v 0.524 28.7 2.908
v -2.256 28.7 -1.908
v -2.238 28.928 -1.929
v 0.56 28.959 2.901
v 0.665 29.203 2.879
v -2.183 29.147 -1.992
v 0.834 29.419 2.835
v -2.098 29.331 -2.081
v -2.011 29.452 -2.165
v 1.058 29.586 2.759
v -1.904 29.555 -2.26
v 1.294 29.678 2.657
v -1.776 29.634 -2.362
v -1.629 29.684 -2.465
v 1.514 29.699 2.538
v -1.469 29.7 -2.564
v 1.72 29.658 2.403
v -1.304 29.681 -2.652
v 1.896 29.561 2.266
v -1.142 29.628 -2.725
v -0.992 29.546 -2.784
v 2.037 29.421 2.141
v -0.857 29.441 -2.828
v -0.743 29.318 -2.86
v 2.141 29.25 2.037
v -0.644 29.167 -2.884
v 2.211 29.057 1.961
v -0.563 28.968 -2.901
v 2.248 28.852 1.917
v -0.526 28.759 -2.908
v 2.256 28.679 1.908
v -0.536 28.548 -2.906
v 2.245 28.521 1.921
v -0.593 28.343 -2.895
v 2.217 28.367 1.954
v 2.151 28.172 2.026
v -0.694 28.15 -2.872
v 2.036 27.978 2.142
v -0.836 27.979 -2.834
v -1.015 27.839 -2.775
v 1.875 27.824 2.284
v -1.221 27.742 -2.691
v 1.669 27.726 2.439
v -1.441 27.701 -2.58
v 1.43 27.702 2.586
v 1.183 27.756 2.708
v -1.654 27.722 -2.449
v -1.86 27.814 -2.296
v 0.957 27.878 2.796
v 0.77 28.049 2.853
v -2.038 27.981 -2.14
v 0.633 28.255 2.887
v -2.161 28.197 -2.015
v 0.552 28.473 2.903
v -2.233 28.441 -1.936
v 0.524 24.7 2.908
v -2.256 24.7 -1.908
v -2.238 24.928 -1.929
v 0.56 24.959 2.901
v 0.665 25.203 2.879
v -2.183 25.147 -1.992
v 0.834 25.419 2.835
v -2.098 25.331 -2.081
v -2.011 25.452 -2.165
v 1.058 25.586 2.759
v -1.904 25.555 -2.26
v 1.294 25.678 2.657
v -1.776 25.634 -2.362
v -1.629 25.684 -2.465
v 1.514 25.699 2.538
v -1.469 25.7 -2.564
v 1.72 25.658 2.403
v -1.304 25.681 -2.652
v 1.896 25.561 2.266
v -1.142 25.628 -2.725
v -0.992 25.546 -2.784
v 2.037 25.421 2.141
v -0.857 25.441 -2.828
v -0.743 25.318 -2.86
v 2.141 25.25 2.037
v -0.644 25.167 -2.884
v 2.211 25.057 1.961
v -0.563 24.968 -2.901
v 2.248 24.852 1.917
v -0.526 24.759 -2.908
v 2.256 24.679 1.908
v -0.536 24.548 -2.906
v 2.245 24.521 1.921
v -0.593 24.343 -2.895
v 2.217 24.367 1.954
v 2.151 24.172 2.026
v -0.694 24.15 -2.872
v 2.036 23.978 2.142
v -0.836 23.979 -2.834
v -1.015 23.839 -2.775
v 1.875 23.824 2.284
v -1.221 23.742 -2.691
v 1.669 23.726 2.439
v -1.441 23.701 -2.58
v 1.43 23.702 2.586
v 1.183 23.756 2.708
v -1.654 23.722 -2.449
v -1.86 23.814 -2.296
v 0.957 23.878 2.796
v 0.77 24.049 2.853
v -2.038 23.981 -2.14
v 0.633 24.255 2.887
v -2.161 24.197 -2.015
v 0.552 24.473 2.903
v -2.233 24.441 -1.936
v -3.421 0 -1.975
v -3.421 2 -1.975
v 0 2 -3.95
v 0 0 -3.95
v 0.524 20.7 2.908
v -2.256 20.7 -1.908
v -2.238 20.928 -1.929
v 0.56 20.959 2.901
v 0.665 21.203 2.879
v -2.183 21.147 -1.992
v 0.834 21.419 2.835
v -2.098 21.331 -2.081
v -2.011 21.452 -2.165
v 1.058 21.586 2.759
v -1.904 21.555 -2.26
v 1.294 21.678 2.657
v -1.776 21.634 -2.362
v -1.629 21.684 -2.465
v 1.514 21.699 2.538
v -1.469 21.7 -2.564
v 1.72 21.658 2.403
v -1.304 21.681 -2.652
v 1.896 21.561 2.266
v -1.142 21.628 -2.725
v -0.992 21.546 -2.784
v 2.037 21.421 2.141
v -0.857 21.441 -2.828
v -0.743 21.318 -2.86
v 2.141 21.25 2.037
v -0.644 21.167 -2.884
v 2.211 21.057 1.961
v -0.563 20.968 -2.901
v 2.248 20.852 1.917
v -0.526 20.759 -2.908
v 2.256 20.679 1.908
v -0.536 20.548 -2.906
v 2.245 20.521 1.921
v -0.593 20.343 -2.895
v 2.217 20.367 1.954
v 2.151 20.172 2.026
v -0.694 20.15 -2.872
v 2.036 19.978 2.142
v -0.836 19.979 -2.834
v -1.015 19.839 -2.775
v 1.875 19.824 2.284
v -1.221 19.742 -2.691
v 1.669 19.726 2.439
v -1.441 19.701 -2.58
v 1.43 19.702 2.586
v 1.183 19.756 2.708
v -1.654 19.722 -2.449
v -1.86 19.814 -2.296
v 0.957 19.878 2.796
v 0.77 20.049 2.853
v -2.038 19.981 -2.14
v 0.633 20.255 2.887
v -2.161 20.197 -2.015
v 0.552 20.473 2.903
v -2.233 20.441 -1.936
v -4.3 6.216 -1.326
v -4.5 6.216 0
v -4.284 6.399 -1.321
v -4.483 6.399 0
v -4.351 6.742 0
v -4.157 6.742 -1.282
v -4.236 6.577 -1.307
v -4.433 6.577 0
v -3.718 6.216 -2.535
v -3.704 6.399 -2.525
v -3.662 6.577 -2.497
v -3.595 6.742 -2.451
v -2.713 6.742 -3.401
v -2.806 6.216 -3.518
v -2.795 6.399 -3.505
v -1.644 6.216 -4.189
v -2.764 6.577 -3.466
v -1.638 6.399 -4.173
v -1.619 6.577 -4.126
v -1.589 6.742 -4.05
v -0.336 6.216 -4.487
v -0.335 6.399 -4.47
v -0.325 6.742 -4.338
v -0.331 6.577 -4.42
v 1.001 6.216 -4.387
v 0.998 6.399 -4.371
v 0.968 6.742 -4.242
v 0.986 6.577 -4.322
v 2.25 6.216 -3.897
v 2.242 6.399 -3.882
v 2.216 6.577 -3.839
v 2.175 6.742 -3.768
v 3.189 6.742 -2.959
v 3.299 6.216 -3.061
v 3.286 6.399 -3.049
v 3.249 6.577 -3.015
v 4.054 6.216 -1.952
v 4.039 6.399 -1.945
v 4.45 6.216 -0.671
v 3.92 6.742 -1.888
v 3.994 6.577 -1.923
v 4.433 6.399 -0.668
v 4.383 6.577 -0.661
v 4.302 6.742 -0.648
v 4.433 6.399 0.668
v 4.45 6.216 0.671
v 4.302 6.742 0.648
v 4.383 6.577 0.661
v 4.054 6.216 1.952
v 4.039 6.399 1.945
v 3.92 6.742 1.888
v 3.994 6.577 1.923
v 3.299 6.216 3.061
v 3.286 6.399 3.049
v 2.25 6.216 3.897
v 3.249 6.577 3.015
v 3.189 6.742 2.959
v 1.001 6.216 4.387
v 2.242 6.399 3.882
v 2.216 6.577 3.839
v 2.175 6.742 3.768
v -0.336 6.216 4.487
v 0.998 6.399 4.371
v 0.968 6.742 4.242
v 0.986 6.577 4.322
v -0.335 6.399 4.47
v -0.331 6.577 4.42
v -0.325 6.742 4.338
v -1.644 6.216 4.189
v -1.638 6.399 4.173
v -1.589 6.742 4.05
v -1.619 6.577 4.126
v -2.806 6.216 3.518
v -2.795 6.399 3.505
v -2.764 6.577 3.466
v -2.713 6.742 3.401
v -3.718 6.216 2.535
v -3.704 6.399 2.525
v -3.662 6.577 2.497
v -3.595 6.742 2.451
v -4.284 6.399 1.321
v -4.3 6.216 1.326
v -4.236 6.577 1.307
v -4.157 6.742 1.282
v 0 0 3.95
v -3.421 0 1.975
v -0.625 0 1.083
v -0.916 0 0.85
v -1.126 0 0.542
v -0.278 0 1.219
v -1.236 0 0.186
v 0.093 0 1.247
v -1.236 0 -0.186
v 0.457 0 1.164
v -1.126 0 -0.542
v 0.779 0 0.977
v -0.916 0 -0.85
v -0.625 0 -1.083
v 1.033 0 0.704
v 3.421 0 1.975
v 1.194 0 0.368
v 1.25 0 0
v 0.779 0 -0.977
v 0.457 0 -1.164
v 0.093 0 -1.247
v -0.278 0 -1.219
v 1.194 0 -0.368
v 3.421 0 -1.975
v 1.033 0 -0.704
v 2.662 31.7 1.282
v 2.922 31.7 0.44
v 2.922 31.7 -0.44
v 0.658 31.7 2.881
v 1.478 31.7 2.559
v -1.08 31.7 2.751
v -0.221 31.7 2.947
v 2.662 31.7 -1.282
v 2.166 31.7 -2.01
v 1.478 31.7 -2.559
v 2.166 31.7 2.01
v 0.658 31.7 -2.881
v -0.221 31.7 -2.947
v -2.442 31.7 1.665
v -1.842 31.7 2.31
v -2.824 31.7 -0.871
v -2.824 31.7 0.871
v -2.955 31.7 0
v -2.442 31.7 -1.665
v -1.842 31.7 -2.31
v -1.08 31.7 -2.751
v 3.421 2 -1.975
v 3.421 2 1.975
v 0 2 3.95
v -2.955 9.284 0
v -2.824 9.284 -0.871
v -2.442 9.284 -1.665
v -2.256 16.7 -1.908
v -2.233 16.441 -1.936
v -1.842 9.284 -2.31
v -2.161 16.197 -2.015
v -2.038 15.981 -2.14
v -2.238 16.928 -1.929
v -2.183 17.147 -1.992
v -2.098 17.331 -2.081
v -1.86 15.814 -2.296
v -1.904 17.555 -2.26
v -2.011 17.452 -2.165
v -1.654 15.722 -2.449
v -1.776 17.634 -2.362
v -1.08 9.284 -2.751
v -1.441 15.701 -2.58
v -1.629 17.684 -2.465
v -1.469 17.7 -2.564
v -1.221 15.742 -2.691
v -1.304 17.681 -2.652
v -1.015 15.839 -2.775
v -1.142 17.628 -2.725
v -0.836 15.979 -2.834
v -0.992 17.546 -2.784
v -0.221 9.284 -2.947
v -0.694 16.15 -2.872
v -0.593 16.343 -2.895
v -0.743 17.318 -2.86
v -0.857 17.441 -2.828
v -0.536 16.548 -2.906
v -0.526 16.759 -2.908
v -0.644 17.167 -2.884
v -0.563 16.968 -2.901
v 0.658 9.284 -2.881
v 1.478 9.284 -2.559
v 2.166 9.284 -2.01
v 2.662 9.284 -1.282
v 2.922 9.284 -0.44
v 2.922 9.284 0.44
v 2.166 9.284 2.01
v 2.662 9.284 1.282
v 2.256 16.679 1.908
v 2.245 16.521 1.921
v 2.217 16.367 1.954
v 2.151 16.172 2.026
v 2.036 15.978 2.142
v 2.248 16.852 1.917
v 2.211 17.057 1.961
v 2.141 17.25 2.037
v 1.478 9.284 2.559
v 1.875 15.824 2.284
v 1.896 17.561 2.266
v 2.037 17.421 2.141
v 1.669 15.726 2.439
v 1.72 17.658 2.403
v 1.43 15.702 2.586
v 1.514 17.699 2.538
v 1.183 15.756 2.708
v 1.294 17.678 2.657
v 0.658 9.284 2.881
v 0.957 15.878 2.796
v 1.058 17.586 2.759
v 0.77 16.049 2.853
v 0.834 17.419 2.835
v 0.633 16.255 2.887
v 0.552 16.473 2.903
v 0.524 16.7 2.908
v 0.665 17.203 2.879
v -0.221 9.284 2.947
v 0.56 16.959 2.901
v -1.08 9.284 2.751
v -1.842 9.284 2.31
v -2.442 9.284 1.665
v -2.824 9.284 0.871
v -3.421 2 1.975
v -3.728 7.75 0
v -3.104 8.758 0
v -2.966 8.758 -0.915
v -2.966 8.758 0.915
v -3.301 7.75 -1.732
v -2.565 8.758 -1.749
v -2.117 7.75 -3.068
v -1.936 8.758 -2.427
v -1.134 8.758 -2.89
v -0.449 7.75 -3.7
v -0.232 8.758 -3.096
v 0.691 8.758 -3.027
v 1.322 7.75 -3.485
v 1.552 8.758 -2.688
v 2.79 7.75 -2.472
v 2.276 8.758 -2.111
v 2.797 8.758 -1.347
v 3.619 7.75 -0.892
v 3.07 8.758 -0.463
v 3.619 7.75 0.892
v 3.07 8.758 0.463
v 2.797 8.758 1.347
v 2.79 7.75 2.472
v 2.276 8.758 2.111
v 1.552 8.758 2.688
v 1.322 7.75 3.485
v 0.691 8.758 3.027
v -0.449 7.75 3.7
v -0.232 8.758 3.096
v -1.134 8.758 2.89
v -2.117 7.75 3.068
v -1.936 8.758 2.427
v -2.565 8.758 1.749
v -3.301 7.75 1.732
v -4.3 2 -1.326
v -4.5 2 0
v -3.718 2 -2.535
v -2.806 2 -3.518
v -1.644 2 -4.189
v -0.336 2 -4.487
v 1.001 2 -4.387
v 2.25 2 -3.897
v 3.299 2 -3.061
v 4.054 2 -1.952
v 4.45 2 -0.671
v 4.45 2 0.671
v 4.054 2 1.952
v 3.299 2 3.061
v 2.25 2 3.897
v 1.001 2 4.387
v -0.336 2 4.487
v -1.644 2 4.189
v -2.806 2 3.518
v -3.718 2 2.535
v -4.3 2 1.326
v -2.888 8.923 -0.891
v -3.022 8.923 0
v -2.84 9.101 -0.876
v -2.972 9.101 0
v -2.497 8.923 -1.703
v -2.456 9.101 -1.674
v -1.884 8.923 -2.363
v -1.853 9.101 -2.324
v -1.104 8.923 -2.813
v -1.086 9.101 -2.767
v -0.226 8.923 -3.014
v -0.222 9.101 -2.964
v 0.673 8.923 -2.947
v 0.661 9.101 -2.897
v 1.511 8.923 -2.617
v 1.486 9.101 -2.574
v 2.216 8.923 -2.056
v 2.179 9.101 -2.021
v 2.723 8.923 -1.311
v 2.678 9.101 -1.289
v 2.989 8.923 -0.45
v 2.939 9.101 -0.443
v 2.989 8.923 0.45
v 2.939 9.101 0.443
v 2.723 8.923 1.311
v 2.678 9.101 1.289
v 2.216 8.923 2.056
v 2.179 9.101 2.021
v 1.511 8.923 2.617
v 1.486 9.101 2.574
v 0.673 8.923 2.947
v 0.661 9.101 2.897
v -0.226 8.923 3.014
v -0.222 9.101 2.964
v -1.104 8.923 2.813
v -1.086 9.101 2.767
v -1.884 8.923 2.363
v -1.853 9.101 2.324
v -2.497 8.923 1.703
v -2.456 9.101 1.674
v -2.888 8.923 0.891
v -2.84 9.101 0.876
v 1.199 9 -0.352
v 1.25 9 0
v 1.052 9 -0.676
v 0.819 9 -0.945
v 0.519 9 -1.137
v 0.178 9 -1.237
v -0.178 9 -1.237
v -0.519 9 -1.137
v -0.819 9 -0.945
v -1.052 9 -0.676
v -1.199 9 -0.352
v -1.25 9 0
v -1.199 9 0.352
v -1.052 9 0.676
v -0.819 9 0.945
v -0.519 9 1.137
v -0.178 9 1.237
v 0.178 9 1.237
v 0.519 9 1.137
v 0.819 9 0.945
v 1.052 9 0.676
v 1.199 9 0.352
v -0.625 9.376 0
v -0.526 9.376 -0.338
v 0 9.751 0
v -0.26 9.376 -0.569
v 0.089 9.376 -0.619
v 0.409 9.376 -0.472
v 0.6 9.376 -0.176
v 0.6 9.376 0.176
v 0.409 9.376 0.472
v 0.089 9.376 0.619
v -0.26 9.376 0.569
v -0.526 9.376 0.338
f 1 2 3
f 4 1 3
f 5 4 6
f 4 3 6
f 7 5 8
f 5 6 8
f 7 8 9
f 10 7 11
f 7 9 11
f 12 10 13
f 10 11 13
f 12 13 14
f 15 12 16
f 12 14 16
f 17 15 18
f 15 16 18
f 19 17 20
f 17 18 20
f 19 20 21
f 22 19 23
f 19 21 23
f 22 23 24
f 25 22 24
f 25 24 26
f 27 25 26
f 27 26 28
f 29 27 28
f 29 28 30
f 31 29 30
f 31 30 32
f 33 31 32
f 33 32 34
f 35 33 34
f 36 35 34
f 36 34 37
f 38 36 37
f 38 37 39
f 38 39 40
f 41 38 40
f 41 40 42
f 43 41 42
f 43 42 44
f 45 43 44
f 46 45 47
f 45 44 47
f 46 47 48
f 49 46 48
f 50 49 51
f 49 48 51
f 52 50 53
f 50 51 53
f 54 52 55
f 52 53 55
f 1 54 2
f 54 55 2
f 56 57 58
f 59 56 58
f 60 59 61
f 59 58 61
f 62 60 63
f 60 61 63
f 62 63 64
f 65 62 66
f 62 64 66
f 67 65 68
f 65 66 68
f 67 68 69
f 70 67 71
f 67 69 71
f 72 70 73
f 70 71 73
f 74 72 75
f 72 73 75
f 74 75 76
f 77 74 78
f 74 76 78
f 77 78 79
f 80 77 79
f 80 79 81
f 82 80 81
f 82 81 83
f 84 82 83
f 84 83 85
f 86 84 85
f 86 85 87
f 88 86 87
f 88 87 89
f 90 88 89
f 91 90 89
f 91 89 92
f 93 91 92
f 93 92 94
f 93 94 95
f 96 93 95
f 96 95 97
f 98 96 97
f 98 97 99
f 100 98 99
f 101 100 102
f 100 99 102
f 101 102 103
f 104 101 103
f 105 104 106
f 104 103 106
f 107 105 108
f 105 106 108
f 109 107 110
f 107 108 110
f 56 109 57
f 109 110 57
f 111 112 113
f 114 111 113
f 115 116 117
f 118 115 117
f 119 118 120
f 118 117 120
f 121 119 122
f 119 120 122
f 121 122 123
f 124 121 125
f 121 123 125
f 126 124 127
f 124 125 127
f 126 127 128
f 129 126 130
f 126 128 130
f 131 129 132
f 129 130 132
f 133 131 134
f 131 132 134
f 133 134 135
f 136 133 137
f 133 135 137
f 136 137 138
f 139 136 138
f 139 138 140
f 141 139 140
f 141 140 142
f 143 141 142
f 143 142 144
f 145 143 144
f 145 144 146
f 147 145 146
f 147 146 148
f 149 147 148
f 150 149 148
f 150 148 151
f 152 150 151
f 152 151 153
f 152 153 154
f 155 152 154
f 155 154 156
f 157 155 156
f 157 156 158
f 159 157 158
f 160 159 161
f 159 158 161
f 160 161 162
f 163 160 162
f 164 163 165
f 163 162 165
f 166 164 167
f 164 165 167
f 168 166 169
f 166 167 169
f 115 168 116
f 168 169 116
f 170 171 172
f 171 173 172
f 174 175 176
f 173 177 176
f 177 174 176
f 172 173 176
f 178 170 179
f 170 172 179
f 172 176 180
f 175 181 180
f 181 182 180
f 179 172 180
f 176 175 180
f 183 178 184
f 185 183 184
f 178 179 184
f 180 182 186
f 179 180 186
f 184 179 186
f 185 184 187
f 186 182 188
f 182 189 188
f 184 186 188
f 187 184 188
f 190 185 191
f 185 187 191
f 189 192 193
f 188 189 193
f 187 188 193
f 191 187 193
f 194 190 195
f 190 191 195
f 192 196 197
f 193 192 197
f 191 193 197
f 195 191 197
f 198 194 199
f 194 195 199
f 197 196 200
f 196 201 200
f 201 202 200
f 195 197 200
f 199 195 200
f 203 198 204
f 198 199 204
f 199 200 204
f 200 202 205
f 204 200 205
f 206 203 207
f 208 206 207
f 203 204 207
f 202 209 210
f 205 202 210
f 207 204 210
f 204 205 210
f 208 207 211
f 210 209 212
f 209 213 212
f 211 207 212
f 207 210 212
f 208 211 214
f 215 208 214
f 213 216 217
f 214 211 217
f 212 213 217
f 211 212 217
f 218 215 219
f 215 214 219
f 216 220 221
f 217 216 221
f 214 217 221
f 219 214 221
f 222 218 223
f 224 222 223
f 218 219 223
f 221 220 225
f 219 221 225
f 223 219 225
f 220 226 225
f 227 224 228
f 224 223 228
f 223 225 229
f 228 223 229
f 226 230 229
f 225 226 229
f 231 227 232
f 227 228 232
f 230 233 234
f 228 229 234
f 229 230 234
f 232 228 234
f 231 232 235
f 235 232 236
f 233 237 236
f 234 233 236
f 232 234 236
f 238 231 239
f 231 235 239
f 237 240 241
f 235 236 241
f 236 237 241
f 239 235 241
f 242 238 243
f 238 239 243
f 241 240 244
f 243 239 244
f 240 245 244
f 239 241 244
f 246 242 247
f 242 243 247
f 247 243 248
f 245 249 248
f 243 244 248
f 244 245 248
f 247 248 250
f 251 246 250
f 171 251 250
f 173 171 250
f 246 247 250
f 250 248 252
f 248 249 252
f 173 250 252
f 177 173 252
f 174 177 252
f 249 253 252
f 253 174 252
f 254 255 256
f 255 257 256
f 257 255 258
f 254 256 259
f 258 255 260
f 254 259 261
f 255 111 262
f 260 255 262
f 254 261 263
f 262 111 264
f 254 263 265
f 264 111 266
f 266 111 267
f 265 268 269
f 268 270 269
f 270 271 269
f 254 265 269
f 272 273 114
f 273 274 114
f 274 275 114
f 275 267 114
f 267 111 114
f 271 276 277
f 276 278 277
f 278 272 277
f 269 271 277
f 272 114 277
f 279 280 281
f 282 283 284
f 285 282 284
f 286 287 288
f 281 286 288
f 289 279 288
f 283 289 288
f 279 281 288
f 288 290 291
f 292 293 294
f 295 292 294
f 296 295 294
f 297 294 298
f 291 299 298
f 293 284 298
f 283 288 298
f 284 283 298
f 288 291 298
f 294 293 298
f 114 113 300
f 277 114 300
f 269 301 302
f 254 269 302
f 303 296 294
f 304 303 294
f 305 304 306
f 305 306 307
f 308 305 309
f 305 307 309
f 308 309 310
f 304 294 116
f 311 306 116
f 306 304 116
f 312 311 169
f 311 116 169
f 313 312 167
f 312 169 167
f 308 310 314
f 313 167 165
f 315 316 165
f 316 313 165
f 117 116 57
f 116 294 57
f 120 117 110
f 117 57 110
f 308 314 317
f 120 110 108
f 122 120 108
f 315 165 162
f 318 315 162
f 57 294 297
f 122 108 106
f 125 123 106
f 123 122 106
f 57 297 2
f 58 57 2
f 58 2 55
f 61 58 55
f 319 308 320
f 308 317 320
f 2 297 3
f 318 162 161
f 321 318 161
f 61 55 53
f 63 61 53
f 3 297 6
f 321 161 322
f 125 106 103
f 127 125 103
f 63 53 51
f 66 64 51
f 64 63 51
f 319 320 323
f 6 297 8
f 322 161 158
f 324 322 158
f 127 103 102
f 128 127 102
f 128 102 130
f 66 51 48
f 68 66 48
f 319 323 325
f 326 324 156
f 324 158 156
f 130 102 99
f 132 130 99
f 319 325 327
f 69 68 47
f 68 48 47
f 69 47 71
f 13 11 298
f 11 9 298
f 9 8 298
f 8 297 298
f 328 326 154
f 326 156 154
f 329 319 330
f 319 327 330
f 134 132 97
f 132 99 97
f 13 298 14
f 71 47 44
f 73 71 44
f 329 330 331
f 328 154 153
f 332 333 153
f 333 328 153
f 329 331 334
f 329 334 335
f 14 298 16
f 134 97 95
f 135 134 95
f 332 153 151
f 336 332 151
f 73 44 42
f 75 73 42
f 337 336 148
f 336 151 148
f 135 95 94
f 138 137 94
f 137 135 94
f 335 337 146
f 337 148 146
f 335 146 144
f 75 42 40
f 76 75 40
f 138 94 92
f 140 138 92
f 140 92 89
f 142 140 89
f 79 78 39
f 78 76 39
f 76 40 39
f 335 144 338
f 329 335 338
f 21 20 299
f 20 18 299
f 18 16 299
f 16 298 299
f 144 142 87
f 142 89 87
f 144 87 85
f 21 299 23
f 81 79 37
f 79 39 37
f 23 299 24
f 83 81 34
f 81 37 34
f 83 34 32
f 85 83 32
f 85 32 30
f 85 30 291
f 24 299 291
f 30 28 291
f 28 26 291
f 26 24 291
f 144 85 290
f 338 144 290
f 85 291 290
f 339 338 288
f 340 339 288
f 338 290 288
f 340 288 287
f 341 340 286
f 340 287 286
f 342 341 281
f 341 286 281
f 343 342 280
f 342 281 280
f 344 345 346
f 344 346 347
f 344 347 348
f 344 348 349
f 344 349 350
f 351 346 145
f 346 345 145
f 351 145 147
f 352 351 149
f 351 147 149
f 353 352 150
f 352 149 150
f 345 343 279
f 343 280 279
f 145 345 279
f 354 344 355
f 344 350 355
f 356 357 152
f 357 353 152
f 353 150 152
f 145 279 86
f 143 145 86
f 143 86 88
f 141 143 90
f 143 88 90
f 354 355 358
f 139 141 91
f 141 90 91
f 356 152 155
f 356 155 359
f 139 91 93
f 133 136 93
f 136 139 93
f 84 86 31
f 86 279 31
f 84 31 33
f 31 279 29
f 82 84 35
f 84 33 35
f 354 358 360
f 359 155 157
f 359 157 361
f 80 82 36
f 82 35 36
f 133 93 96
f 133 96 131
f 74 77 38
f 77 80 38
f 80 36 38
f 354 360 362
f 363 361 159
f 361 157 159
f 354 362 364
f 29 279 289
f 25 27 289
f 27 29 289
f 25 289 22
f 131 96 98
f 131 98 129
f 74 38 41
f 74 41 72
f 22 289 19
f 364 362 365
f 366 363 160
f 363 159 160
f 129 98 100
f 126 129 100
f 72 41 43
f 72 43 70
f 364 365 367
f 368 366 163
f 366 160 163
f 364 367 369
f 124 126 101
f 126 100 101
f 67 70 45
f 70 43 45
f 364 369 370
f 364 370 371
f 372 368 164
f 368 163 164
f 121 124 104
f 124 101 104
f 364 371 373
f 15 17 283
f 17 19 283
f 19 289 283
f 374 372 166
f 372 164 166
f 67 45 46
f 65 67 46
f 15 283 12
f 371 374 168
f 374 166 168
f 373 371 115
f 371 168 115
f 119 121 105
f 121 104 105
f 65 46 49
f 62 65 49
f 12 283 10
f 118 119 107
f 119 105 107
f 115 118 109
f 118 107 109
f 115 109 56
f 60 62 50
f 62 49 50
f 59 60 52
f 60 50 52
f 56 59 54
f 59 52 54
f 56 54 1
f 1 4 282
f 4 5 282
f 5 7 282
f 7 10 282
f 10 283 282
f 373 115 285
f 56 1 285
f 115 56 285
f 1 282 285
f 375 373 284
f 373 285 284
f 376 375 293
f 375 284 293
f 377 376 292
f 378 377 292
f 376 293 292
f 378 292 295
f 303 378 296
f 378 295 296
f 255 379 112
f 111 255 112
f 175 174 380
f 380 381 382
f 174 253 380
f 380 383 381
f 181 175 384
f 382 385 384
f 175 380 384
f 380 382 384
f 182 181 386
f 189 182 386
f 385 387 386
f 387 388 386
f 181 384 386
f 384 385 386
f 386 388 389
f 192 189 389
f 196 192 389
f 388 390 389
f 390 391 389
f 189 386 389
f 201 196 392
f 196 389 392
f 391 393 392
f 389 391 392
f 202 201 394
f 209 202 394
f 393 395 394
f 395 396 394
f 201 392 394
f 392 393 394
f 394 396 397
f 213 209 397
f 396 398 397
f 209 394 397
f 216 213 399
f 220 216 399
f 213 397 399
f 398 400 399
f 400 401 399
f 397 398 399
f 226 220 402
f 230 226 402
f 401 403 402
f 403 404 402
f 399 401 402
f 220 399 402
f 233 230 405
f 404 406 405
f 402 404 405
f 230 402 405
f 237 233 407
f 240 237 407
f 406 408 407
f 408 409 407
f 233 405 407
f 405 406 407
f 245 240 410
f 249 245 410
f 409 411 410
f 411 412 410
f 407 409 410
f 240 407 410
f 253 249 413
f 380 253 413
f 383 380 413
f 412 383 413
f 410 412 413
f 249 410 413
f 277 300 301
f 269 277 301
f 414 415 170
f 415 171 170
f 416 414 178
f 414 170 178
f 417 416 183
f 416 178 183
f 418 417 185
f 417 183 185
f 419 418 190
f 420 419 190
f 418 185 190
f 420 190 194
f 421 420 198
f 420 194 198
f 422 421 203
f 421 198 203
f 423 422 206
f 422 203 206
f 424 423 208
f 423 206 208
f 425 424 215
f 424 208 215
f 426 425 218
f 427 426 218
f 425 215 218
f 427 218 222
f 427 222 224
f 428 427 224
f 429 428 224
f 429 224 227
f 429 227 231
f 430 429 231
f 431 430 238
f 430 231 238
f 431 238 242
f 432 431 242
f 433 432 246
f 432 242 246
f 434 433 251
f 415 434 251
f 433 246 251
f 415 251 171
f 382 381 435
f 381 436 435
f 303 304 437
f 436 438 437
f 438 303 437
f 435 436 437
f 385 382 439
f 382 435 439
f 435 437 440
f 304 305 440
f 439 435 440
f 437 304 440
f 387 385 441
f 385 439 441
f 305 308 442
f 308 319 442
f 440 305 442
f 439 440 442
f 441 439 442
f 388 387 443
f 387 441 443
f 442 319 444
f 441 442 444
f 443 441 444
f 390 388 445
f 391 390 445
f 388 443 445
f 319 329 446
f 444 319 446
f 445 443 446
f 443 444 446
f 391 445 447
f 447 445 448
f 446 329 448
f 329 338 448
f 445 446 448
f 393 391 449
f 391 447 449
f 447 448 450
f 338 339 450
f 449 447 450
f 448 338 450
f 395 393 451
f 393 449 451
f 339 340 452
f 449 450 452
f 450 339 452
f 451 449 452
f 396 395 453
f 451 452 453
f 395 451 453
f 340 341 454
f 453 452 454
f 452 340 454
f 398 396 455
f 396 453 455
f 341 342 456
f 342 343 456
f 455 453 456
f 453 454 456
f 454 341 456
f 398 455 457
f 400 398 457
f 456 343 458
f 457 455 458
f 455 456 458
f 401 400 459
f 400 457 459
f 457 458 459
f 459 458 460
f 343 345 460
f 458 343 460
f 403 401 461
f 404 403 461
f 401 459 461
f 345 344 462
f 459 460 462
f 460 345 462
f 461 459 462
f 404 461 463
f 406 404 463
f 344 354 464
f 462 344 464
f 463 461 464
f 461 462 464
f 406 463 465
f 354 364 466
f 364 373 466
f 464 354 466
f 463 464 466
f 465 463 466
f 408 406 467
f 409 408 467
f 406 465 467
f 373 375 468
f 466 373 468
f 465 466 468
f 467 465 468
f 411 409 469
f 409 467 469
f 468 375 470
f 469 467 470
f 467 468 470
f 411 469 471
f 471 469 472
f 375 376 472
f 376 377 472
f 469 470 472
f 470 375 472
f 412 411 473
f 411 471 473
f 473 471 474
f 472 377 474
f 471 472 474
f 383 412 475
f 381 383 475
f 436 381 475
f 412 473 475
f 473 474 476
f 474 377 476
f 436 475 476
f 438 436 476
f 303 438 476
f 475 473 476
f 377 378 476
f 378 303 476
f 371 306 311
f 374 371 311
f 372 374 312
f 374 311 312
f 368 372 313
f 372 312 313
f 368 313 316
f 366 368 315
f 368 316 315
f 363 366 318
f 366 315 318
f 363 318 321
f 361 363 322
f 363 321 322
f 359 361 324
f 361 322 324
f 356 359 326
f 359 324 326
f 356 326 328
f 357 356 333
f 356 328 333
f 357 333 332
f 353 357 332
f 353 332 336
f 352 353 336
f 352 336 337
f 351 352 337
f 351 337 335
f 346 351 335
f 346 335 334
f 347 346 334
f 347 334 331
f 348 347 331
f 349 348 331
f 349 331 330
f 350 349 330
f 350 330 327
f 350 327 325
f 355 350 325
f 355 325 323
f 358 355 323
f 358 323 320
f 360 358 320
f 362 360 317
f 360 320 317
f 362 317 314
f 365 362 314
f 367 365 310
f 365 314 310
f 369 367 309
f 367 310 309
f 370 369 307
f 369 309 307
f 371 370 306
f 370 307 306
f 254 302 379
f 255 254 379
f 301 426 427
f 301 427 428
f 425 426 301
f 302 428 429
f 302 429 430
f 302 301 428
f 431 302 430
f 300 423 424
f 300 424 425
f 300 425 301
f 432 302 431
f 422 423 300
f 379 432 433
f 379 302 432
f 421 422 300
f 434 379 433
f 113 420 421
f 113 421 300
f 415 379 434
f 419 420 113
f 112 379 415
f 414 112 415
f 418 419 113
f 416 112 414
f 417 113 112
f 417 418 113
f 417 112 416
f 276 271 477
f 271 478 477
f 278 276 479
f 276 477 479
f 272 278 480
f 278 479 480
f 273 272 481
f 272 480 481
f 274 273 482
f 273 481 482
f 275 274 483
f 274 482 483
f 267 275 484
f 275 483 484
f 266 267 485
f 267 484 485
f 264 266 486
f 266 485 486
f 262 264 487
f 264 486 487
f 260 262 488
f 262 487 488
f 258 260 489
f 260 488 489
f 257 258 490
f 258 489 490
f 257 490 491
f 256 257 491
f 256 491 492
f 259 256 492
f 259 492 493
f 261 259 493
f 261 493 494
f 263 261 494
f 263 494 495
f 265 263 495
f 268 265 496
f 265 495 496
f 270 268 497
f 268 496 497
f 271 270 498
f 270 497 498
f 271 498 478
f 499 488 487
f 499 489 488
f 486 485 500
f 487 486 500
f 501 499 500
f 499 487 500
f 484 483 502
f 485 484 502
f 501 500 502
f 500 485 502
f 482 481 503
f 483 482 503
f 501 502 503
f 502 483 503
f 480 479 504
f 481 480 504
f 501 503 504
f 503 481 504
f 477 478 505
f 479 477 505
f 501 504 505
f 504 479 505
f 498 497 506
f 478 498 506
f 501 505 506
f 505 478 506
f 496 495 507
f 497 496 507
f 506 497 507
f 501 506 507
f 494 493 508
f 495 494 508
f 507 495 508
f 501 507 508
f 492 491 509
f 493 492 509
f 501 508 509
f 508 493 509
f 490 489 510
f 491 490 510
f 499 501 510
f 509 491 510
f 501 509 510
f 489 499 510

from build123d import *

# Parameters (mm, degrees)
TAGLIO_ESTRUSIONE1_START      = -2
SCHIZZO2_R                    = 4.5
TAGLIO_ESTRUSIONE1_DEPTH      = 2
FORO_FILETTATO_M3X0_5_1_D     = 2.5
FORO_FILETTATO_M3X0_5_1_DEPTH = 9
FORO_FILETTATO_M3X0_5_1_TIP   = 0.751075774
SCHIZZO5_R                    = 1
TAGLIO_ESTRUSIONE2_DEPTH      = 34.021984656


with BuildPart() as part:
    # Schizzo1 → Rivoluzione1 (revolve)
    with BuildSketch(Plane.XY):
        with BuildLine():
            Line((0, 0), (4.5, 0))
            Line((4.5, 0), (4.5, 6.215934246))
            ThreePointArc((4.5, 6.215934246), (4.461941718, 6.489188945), (4.350663738, 6.741644436))
            Line((4.350663738, 6.741644436), (3.104336262, 8.758355564))
            ThreePointArc((3.104336262, 8.758355564), (2.993058282, 9.010811055), (2.955, 9.284065754))
            Line((2.955, 9.284065754), (2.955, 31.7))
            Line((2.955, 31.7), (0, 31.7))
            Line((0, 31.7), (0, 0))
        make_face()
    revolve(axis=Axis((0, 31.7, 0), (0, -1, 0)))

    # Schizzo2 → Taglio-Estrusione1 (cut)
    with BuildSketch(Plane.XZ.offset(TAGLIO_ESTRUSIONE1_START)):
        Circle(SCHIZZO2_R)
        Polygon((0, 3.95), (-3.420800345, 1.975), (-3.420800345, -1.975), (0, -3.95), (3.420800345, -1.975), (3.420800345, 1.975), align=None, mode=Mode.SUBTRACT)
    extrude(amount=TAGLIO_ESTRUSIONE1_DEPTH, mode=Mode.SUBTRACT)

    # Foro filettato M3x0.5-1
    with Locations(Plane(origin=(0, 0, 0), x_dir=(-1, 0, 0), z_dir=(0, -1, 0))):
        with Locations((0, 0)):
            Hole(FORO_FILETTATO_M3X0_5_1_D / 2, depth=FORO_FILETTATO_M3X0_5_1_DEPTH)
            with Locations((0, 0, -(FORO_FILETTATO_M3X0_5_1_DEPTH + FORO_FILETTATO_M3X0_5_1_TIP / 2))):  # 118° drill point
                Cone(0, FORO_FILETTATO_M3X0_5_1_D / 2, FORO_FILETTATO_M3X0_5_1_TIP, mode=Mode.SUBTRACT)

    # Schizzo5 → Taglio-Estrusione2 (cut, through all)
    with BuildSketch(Plane(origin=(-1.4775, 0, -2.559105068), x_dir=(-0.8660254037844385, 0, 0.5000000000000004), z_dir=(-0.5000000000000003, 0, -0.8660254037844384))):
        with Locations((0, 16.7)):
            Circle(SCHIZZO5_R)
        with Locations((0, 20.7)):
            Circle(SCHIZZO5_R)
        with Locations((0, 24.7)):
            Circle(SCHIZZO5_R)
        with Locations((0, 28.7)):
            Circle(SCHIZZO5_R)
    extrude(amount=-TAGLIO_ESTRUSIONE2_DEPTH, mode=Mode.SUBTRACT)


solid = part.part
